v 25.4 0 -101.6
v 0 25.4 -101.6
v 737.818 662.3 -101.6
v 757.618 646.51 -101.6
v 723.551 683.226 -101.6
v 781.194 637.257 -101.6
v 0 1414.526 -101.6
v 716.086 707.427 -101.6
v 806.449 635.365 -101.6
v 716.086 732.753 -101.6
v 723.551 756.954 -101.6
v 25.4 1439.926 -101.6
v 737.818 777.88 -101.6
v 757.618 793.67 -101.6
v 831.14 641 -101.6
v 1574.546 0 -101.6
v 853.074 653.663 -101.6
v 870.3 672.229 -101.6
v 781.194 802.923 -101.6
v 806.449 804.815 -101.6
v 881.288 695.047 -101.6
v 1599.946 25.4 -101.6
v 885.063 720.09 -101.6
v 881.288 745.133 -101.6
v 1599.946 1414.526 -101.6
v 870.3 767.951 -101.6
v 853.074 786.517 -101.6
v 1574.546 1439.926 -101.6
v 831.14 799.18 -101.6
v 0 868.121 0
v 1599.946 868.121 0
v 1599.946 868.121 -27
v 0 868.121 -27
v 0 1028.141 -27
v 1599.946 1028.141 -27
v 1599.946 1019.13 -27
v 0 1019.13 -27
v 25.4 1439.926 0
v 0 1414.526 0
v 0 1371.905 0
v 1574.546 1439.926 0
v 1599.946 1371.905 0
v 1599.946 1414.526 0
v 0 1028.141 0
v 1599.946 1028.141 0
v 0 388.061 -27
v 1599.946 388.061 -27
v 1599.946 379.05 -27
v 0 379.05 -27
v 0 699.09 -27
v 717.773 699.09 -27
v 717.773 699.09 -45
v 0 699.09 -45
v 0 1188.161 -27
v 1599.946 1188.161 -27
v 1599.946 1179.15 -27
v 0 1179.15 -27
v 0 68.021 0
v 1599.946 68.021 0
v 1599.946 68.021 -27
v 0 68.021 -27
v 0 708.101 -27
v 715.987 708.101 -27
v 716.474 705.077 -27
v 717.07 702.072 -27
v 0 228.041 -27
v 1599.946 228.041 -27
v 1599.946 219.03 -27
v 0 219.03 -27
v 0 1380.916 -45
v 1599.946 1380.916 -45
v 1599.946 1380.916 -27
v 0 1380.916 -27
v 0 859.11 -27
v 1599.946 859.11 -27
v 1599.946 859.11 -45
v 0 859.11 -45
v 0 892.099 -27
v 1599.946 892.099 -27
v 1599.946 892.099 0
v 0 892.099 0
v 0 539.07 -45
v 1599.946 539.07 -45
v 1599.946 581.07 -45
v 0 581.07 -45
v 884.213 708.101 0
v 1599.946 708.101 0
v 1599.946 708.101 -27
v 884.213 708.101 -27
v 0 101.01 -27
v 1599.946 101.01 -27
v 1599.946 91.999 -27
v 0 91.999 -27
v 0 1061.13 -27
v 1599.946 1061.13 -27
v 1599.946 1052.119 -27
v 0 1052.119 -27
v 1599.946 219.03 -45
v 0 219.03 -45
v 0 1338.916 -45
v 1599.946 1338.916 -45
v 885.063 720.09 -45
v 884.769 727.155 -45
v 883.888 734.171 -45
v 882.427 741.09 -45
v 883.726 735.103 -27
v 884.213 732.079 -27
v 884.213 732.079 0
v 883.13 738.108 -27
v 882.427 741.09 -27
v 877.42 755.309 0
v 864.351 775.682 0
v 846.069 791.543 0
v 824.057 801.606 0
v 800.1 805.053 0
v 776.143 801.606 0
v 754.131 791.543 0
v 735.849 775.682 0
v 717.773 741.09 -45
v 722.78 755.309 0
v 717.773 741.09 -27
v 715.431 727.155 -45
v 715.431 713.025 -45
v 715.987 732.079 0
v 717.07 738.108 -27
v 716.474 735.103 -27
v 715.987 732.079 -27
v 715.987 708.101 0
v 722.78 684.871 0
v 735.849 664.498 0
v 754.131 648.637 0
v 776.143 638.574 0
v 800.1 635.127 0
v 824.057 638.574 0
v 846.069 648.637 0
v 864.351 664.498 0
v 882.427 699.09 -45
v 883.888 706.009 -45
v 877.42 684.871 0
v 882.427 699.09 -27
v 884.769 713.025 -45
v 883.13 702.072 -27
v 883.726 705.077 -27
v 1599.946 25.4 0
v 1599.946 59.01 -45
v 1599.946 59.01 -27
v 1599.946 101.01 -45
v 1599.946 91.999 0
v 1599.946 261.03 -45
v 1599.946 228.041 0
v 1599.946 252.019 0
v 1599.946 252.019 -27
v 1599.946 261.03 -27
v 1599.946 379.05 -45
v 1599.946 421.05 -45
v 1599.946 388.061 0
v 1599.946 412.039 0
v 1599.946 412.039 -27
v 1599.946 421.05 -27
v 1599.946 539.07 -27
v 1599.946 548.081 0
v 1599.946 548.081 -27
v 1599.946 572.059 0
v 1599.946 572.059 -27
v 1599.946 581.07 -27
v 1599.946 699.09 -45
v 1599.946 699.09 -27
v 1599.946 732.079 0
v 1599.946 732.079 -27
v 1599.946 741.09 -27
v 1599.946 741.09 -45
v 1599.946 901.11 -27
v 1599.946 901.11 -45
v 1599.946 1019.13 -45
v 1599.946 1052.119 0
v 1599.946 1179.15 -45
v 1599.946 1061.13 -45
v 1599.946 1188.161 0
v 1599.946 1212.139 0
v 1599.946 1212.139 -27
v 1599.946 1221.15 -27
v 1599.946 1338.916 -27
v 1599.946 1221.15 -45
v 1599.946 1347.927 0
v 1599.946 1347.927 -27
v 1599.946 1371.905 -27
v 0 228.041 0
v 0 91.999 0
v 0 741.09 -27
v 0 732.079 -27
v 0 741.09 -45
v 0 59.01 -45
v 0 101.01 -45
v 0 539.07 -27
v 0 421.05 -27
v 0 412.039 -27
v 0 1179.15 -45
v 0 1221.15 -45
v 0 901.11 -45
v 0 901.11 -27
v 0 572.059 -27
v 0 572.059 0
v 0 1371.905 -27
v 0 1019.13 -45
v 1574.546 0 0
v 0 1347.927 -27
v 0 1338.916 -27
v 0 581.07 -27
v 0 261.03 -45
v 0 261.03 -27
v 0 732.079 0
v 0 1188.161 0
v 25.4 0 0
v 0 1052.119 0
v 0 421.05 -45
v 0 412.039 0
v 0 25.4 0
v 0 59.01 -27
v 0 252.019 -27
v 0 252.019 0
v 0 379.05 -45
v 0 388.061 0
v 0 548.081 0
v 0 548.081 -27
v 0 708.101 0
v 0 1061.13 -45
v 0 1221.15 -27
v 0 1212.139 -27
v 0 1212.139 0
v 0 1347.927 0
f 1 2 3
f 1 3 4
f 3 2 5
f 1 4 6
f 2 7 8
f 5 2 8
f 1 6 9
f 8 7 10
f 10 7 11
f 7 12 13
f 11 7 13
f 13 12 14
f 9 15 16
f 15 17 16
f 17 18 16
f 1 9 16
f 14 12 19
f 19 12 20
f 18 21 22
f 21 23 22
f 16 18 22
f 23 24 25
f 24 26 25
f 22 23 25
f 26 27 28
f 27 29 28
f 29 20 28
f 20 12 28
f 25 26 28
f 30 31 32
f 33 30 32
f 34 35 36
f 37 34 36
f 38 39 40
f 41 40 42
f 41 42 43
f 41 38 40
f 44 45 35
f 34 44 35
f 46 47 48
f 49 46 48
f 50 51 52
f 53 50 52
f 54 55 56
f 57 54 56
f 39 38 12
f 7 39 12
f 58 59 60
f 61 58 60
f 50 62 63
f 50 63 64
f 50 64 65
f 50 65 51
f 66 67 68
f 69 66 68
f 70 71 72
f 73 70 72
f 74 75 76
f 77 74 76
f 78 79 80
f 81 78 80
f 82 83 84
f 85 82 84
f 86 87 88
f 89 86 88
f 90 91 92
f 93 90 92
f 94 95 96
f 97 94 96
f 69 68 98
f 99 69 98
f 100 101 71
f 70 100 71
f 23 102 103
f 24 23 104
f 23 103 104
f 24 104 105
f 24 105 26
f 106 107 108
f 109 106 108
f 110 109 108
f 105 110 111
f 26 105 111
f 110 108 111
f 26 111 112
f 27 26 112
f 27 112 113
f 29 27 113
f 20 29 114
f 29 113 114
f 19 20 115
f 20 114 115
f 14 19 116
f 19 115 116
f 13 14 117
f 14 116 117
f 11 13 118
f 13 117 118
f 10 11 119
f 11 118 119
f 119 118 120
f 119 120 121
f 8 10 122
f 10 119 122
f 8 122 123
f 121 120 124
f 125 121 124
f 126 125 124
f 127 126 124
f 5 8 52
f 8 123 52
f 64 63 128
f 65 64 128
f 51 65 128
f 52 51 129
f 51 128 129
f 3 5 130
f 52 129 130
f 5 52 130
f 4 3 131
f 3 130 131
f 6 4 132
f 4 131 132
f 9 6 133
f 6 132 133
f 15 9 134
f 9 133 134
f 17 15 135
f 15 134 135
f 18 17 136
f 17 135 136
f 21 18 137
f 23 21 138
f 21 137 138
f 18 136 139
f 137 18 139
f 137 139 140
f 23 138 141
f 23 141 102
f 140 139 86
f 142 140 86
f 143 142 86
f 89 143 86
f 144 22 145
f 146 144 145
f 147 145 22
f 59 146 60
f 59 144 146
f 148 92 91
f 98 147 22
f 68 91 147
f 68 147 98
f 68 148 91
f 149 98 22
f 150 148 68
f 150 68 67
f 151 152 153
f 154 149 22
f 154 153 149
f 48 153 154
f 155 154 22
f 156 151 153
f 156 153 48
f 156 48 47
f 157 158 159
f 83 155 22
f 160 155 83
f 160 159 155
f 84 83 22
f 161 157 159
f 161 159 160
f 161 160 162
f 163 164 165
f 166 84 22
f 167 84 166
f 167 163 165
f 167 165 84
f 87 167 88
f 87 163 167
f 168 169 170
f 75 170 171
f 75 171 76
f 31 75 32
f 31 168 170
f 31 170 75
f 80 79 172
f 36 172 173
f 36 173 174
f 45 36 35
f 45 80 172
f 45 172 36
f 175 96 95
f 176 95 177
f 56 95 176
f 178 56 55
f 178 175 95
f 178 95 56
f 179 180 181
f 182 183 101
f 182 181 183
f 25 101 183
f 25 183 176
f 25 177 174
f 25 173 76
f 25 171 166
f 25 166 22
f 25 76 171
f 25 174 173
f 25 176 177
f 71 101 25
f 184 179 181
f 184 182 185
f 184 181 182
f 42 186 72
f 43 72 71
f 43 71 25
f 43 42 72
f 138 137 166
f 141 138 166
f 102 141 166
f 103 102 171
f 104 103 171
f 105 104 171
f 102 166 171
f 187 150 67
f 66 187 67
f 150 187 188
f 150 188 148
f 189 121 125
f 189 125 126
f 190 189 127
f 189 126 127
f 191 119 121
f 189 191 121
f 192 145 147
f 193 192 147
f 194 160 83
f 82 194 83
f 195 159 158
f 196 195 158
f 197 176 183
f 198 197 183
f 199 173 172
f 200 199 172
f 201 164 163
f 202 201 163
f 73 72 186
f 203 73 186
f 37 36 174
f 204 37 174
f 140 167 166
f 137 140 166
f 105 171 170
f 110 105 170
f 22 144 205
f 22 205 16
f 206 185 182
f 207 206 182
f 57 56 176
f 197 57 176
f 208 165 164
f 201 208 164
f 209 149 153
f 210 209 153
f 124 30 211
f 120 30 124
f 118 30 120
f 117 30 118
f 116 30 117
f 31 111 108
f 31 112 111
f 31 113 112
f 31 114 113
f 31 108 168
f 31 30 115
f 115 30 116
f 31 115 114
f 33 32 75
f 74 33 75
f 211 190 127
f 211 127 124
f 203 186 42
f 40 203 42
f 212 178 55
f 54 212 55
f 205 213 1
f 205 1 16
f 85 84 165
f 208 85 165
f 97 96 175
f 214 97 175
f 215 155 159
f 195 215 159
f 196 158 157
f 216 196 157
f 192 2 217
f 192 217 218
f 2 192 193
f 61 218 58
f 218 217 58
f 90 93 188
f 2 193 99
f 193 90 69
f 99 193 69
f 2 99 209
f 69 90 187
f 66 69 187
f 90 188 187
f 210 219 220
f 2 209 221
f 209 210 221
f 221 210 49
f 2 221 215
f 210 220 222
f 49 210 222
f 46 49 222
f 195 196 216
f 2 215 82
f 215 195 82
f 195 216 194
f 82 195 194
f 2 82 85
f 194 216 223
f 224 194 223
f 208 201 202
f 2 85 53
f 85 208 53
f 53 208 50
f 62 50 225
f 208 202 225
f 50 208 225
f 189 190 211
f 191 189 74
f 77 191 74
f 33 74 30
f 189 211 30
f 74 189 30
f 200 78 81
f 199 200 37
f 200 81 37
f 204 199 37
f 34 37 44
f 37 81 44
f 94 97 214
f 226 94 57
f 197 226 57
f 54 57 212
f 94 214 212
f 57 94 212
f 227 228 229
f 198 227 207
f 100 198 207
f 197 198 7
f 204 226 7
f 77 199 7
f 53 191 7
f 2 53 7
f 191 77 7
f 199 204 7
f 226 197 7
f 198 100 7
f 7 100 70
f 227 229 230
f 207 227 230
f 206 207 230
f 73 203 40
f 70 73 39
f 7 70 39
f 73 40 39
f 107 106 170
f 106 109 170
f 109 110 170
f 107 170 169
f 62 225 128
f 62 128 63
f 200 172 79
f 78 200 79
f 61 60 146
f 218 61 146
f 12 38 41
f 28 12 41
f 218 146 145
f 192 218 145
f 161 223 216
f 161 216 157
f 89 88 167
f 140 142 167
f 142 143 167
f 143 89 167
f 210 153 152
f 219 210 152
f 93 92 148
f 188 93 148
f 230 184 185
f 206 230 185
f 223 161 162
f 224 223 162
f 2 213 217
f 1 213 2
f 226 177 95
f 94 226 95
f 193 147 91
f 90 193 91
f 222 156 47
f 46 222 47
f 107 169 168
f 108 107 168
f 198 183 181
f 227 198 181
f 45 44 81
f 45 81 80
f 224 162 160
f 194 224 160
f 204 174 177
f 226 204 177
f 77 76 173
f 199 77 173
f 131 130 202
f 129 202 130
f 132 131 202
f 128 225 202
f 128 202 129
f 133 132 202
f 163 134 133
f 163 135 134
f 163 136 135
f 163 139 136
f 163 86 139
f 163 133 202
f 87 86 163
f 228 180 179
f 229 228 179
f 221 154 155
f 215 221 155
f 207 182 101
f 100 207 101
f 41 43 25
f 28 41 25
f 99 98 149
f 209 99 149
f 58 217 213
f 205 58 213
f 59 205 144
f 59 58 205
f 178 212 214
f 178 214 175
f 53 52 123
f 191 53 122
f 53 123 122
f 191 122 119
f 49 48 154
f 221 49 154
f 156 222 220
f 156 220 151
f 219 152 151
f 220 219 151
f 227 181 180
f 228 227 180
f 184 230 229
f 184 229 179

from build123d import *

# Parameters (mm, degrees)
F0_W     = 1599.946
F0_H     = 1439.926
F1_DEPTH = 101.6
F3_DEPTH = 1599.947
F4_SIZE  = 25.4
F5_R     = 84.963
F6_DEPTH = 101.601


with BuildPart() as f1:
    # F0 (on Top) → F1 (new body)
    with BuildSketch(Plane.XY):
        with Locations((799.973, 719.963)):
            Rectangle(F0_W, F0_H)
    extrude(amount=-F1_DEPTH)

    # F2 (on face) → F3 (cut, through all)
    with BuildSketch(Plane.YZ.offset(1599.946)):
        Polygon((91.9988, 0), (68.0212, 0), (68.0212, -26.9914), (68.0212, -27), (59.01, -27), (59.01, -45), (101.01, -45), (101.01, -27), (91.9988, -27), (91.9988, -26.9914), align=None)
        Polygon((1371.9048, -26.9914), (1371.9048, 0), (1347.9272, 0), (1347.9272, -26.9914), (1347.9272, -27), (1338.916, -27), (1338.916, -45), (1380.916, -45), (1380.916, -27), (1371.9048, -27), align=None)
        Polygon((261.03, -27), (252.0188, -27), (252.0188, -26.9914), (252.0188, 0), (228.0412, 0), (228.0412, -26.9914), (228.0412, -27), (219.03, -27), (219.03, -45), (261.03, -45), align=None)
        Polygon((421.05, -27), (412.0388, -27), (412.0388, -26.9914), (412.0388, 0), (388.0612, 0), (388.0612, -26.9914), (388.0612, -27), (379.05, -27), (379.05, -45), (421.05, -45), align=None)
        Polygon((581.07, -27), (572.0588, -27), (572.0588, -26.9914), (572.0588, 0), (548.0812, 0), (548.0812, -26.9914), (548.0812, -27), (539.07, -27), (539.07, -45), (581.07, -45), align=None)
        Polygon((741.09, -27), (732.0788, -27), (732.0788, -26.9914), (732.0788, 0), (708.1012, 0), (708.1012, -26.9914), (708.1012, -27), (699.09, -27), (699.09, -45), (741.09, -45), align=None)
        Polygon((901.11, -27), (892.0988, -27), (892.0988, -26.9914), (892.0988, 0), (868.1212, 0), (868.1212, -26.9914), (868.1212, -27), (859.11, -27), (859.11, -45), (901.11, -45), align=None)
        Polygon((1061.13, -27), (1052.1188, -27), (1052.1188, -26.9914), (1052.1188, 0), (1028.1412, 0), (1028.1412, -26.9914), (1028.1412, -27), (1019.13, -27), (1019.13, -45), (1061.13, -45), align=None)
        Polygon((1221.15, -27), (1212.1388, -27), (1212.1388, -26.9914), (1212.1388, 0), (1188.1612, 0), (1188.1612, -26.9914), (1188.1612, -27), (1179.15, -27), (1179.15, -45), (1221.15, -45), align=None)
    extrude(amount=-F3_DEPTH, mode=Mode.SUBTRACT)

    # F4
    f4_edges = [f1.edges().sort_by_distance(p)[0] for p in [
        (1599.946, 0, -50.8),
        (1599.946, 1439.926, -50.8),
        (0, 0, -50.8),
        (0, 1439.926, -50.8),
    ]]
    chamfer(f4_edges, length=F4_SIZE)

    # F5 (on face) → F6 (cut, through all)
    with BuildSketch(Plane.XY):
        with Locations((800.1, 720.09)):
            Circle(F5_R)
    extrude(amount=-F6_DEPTH, mode=Mode.SUBTRACT)


solid = f1.part
